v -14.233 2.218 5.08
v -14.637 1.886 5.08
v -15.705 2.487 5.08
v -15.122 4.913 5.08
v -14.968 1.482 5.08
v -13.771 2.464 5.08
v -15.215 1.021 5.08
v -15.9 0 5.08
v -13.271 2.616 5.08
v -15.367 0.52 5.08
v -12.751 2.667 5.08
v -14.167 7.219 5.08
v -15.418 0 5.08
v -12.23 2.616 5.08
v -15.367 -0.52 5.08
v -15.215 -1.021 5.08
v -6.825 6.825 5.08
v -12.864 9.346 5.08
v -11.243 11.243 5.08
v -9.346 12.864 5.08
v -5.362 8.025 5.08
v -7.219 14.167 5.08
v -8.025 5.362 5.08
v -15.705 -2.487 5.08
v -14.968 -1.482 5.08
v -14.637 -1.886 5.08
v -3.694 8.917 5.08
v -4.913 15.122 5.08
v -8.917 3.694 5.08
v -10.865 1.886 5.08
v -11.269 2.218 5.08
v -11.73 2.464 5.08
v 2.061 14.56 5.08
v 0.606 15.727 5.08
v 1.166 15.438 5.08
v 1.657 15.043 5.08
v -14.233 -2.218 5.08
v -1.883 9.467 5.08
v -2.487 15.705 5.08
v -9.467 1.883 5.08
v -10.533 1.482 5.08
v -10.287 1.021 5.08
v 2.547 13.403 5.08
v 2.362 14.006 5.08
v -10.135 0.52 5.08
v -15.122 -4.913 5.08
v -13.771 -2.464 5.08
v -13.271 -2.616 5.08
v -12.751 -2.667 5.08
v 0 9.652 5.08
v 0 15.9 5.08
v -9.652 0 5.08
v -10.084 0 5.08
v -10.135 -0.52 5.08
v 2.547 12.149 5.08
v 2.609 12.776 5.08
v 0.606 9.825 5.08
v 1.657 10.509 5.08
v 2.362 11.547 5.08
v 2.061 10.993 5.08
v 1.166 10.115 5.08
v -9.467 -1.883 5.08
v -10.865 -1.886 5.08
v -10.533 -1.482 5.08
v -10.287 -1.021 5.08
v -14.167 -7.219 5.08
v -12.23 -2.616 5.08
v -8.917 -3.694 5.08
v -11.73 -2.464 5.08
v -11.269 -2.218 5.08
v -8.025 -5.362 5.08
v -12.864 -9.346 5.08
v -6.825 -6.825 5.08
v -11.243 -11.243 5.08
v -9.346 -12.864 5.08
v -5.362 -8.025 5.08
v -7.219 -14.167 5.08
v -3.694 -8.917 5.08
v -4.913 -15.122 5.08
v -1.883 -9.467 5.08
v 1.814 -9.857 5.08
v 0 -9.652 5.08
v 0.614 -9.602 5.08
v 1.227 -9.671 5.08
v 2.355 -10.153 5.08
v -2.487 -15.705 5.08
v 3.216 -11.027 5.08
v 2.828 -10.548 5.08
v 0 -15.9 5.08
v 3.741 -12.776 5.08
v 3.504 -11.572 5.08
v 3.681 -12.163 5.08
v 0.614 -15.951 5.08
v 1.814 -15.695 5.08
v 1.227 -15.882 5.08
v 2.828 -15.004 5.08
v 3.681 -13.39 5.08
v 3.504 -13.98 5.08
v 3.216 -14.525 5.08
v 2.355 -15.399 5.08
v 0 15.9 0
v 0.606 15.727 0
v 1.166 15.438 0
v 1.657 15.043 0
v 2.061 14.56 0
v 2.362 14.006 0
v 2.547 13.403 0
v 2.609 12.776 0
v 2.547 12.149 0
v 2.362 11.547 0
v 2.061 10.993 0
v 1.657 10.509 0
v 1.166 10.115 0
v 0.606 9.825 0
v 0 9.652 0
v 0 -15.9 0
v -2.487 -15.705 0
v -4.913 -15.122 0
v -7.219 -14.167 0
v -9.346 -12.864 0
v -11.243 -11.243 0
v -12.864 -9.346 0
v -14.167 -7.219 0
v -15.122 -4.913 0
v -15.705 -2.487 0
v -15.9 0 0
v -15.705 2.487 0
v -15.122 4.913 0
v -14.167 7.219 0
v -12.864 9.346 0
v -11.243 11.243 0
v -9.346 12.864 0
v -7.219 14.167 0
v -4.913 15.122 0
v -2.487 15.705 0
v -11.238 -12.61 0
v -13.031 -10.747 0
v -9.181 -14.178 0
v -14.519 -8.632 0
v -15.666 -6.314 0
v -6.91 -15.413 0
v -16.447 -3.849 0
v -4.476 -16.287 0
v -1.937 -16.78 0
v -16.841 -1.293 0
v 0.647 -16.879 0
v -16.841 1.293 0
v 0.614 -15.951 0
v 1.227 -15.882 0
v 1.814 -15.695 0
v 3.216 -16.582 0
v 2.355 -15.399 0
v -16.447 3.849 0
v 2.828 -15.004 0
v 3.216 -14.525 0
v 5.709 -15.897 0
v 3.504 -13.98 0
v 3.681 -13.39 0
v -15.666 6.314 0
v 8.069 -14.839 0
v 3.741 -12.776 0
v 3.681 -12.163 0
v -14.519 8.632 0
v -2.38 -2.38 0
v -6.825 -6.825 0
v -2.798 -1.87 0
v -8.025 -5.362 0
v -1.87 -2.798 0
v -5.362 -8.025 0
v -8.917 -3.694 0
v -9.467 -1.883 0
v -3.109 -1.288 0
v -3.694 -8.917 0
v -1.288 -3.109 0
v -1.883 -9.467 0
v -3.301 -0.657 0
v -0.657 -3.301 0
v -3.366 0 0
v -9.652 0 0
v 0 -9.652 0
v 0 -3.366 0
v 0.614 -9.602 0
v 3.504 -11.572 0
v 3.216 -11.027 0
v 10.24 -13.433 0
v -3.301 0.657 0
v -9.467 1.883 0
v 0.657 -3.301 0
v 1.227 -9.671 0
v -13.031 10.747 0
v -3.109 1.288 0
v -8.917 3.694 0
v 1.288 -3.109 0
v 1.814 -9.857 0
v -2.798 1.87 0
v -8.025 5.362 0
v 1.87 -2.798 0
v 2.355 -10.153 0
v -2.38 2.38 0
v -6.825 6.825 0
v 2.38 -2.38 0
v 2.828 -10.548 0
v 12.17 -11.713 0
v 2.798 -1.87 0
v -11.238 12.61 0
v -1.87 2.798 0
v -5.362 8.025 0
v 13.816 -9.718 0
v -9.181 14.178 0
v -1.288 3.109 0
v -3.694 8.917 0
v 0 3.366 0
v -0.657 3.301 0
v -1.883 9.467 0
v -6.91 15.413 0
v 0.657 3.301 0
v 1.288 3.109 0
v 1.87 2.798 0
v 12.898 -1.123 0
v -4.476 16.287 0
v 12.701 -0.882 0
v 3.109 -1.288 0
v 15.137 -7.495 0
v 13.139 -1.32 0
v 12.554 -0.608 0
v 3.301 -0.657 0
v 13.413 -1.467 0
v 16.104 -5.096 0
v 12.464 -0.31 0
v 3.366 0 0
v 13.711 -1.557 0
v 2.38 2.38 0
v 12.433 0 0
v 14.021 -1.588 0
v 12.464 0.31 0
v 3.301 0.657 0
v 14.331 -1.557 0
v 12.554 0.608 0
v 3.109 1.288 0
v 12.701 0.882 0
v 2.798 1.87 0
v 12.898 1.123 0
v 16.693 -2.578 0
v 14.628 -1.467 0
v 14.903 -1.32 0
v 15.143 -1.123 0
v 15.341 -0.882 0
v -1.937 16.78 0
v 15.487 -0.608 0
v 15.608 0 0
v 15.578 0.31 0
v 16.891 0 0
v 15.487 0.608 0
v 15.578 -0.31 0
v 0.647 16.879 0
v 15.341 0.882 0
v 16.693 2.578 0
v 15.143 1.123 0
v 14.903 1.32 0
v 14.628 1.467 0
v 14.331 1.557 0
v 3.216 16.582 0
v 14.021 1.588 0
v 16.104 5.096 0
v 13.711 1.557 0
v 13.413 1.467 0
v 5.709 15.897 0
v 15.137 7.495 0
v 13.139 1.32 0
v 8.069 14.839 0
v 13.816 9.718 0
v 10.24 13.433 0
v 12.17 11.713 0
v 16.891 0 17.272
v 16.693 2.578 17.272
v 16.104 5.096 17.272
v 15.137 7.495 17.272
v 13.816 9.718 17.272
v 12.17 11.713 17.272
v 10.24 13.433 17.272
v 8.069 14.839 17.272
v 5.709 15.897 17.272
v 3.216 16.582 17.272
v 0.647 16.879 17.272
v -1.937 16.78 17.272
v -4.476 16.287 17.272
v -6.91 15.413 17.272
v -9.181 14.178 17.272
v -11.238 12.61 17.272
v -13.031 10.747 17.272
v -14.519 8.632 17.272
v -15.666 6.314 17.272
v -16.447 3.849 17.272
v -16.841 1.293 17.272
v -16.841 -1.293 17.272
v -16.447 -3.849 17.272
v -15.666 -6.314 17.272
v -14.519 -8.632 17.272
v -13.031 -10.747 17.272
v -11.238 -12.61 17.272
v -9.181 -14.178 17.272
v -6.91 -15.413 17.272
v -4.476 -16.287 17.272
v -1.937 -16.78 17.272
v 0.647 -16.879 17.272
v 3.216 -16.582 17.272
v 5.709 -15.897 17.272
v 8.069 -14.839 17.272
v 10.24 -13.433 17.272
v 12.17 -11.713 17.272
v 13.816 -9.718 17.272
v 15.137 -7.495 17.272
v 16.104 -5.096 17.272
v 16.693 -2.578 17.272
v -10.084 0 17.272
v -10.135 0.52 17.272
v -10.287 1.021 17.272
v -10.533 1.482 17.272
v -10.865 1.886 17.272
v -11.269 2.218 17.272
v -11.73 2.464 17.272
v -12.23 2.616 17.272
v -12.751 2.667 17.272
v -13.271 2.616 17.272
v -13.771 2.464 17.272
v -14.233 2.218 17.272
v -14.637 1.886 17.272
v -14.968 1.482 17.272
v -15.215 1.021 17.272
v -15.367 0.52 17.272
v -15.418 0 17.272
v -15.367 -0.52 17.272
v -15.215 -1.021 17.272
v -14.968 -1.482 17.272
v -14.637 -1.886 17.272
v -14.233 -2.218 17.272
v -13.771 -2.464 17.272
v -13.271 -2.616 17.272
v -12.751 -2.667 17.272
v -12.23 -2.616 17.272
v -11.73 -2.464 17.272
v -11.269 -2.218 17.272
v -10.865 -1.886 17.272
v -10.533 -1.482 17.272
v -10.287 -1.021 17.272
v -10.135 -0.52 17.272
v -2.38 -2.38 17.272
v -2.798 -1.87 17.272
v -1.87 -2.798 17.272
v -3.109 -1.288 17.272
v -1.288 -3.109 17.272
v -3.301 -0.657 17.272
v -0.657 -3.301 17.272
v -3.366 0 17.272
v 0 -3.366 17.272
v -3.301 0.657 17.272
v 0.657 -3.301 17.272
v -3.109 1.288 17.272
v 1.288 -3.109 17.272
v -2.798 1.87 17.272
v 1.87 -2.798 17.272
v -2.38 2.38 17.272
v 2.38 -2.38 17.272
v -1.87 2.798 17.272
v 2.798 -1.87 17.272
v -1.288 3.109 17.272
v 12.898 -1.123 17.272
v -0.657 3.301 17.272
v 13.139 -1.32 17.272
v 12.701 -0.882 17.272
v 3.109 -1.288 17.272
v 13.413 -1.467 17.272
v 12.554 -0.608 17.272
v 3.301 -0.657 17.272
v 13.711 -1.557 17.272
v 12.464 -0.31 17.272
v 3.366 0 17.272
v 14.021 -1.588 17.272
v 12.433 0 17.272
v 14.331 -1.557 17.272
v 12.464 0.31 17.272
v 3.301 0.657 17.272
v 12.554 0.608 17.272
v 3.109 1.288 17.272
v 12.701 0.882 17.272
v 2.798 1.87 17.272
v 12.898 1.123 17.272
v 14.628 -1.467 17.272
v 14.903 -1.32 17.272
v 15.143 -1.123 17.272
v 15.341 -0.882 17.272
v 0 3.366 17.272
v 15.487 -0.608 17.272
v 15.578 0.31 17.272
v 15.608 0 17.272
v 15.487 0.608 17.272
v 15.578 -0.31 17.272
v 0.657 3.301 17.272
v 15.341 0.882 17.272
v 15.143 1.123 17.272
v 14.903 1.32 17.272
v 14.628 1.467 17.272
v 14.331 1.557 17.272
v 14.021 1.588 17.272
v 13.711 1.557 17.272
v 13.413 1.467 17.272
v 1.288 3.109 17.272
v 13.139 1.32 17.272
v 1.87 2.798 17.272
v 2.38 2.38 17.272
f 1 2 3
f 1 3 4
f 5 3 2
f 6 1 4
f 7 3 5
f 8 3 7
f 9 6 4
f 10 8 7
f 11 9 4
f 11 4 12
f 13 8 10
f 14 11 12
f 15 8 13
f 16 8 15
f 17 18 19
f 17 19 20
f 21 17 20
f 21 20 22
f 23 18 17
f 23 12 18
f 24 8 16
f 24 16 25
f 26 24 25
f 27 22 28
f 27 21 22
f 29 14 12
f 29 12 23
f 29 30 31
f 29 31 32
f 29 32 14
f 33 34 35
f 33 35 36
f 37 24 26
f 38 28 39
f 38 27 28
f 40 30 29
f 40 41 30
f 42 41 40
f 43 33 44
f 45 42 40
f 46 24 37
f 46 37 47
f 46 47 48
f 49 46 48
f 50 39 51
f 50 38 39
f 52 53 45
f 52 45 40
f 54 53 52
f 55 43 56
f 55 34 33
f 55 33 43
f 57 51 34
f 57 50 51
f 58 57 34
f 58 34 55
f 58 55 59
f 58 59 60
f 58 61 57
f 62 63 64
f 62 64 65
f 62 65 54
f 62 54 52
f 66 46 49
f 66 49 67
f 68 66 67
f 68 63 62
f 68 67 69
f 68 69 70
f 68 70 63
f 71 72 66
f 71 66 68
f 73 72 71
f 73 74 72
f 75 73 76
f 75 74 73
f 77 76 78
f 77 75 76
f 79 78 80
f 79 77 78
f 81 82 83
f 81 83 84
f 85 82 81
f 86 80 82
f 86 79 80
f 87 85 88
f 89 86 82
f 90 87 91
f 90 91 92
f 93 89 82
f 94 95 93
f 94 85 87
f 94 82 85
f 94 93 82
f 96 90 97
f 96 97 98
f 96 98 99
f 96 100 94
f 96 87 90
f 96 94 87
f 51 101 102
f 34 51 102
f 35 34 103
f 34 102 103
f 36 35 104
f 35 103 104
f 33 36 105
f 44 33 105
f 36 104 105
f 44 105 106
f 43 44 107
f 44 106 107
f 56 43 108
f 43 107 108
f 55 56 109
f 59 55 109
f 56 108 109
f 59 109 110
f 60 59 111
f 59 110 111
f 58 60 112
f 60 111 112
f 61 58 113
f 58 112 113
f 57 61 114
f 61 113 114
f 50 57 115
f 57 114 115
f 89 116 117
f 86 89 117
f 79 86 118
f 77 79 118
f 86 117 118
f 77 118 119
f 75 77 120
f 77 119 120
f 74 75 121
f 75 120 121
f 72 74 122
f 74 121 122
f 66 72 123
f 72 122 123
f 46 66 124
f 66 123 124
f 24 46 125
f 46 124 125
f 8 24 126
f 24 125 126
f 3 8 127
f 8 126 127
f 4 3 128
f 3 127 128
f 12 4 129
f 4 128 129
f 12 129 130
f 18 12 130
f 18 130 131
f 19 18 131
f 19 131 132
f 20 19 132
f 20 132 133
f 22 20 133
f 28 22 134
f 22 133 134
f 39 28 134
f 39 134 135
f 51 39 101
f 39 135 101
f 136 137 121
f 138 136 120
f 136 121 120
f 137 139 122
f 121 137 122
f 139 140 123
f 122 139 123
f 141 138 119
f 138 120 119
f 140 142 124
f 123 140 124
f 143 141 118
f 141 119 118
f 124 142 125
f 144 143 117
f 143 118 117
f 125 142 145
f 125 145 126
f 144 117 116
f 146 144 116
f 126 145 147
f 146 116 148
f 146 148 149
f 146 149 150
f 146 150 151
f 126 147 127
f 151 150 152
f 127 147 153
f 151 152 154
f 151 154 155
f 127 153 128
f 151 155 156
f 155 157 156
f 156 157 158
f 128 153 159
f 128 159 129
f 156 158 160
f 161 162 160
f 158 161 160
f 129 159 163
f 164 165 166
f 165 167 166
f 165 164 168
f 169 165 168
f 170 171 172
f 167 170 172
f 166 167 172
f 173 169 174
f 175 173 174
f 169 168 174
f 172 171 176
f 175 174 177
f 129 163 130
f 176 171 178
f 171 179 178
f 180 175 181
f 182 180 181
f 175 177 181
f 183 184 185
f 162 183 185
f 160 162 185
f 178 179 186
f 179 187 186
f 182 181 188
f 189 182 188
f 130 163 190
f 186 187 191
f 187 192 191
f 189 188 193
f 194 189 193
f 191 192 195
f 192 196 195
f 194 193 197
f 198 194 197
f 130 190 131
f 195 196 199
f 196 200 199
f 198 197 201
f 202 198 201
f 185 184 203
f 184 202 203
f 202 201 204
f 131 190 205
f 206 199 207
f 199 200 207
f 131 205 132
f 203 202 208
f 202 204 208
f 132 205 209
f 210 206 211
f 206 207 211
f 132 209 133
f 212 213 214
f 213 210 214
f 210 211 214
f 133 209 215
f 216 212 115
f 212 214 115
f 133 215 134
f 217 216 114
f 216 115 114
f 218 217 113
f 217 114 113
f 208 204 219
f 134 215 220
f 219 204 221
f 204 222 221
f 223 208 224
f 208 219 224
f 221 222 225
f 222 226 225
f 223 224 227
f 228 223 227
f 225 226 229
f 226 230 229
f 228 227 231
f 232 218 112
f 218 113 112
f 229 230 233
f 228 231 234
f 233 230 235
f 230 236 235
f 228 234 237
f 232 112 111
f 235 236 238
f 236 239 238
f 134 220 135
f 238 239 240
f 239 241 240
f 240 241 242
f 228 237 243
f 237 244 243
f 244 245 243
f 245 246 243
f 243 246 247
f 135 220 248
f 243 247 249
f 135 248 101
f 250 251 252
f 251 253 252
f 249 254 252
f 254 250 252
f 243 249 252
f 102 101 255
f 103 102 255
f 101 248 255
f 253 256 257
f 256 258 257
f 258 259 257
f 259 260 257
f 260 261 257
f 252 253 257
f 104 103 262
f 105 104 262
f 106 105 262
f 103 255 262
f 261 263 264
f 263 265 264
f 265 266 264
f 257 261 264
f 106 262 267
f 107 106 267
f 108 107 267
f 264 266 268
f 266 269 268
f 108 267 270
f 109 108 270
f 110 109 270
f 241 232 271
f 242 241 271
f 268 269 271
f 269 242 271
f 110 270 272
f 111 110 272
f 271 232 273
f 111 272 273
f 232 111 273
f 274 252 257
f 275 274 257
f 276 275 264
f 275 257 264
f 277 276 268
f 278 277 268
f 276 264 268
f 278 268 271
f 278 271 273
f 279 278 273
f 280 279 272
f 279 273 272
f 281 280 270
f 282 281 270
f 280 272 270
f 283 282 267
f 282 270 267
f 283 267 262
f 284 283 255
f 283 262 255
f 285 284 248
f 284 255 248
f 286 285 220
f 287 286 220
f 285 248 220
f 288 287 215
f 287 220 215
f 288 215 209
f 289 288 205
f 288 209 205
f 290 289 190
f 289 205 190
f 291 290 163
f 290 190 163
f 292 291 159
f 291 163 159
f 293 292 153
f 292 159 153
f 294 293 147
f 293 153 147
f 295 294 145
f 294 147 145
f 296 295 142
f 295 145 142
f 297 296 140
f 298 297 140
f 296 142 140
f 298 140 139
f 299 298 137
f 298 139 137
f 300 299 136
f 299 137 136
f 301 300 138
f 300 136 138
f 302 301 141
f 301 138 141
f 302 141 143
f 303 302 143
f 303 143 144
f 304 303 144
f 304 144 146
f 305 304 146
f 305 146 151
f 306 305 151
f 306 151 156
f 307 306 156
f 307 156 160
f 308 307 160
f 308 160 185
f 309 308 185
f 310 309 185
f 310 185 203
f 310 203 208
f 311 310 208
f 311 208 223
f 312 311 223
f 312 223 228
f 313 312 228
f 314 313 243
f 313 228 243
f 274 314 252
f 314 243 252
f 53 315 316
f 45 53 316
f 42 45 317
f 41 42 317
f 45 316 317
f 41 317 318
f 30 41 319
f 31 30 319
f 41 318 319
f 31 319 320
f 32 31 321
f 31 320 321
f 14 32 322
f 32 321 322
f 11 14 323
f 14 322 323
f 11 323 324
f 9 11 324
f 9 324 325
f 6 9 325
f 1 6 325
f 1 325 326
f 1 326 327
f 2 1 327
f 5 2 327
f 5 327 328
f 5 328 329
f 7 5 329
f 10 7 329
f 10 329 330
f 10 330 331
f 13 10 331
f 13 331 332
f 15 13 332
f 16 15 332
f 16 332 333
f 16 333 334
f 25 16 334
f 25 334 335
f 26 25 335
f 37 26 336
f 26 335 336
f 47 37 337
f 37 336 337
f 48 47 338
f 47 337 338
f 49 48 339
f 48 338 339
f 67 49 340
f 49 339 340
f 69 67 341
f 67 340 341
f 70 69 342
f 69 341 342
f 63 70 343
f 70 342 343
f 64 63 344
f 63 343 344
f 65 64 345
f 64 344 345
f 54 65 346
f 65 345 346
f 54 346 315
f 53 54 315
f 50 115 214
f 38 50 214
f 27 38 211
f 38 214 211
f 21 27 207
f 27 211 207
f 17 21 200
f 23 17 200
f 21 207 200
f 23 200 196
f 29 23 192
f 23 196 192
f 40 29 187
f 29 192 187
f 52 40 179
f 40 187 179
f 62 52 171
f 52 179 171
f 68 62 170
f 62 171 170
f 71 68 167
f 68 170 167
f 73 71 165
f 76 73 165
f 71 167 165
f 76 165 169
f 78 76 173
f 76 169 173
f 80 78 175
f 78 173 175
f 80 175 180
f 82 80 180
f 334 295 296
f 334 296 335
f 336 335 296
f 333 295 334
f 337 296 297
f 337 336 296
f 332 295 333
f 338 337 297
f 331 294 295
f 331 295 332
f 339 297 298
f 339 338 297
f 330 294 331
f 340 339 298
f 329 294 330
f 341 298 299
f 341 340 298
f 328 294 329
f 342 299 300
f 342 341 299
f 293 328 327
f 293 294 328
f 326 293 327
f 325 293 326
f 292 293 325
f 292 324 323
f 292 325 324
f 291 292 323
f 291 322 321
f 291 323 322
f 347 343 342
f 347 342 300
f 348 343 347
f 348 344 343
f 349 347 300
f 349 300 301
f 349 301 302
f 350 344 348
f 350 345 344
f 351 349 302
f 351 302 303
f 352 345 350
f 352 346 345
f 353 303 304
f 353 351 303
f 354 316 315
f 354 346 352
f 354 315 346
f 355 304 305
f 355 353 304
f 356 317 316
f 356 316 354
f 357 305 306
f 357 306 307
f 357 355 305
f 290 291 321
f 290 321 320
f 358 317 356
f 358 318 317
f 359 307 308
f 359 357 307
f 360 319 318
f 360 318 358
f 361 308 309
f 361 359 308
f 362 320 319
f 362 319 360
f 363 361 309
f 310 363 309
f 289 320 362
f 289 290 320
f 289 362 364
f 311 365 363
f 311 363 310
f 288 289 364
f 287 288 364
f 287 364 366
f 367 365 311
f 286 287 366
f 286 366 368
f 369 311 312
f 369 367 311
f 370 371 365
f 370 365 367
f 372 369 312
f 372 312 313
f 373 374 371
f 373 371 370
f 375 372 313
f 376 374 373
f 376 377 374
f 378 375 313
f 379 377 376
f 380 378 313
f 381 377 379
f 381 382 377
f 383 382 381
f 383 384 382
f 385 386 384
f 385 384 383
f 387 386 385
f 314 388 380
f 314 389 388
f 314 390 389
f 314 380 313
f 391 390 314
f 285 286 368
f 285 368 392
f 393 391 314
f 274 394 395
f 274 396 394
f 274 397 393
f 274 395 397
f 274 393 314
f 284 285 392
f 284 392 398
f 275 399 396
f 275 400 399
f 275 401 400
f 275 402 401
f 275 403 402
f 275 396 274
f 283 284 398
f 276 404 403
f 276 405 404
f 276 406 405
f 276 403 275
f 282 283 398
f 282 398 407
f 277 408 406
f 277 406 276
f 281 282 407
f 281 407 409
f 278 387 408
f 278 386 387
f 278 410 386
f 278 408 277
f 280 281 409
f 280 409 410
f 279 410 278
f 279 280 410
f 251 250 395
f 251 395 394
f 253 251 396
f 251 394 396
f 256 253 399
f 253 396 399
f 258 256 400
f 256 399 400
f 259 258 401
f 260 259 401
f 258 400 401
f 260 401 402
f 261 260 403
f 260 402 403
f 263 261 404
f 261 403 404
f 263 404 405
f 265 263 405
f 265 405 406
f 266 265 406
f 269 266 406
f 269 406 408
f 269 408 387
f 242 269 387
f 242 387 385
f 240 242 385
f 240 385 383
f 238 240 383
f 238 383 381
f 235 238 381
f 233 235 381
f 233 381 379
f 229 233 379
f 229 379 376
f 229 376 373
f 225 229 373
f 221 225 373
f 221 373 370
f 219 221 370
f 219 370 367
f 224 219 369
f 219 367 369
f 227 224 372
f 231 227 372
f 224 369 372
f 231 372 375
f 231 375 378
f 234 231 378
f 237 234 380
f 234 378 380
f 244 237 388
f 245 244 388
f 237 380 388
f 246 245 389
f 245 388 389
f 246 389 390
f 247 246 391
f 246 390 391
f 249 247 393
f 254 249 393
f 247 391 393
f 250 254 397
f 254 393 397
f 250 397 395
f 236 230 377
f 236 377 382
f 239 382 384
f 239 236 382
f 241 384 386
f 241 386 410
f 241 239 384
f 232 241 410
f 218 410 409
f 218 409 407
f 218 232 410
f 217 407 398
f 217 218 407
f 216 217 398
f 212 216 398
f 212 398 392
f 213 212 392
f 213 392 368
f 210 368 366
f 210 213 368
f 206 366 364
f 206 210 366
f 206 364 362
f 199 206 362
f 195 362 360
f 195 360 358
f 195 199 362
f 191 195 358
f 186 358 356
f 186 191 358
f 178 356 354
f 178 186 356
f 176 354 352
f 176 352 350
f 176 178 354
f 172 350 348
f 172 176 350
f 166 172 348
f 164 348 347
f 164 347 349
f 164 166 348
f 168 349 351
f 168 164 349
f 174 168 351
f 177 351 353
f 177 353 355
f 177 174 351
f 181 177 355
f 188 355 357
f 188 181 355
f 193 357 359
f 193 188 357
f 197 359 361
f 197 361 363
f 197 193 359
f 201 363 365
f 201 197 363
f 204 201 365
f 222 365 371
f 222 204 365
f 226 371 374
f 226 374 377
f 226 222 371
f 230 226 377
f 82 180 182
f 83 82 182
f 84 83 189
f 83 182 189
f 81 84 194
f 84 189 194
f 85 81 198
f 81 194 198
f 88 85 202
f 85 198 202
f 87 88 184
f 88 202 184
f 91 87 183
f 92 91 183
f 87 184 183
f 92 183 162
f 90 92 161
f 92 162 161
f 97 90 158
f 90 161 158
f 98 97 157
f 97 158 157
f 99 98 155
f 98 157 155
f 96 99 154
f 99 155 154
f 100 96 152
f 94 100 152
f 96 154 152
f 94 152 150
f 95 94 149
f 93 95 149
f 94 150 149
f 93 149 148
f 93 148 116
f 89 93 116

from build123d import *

# Parameters (mm, degrees)
F0_R     = 16.891
F0_R_2   = 3.3655
F1_DEPTH = 17.272
F2_R     = 1.5875
F2_R_2   = 2.667
F3_DEPTH = 25.4
F5_DEPTH = 5.08


with BuildPart() as f1:
    # F0 (on Top) → F1 (new body)
    with BuildSketch(Plane.XY):
        Circle(F0_R)
        Circle(F0_R_2, mode=Mode.SUBTRACT)
    extrude(amount=F1_DEPTH)

    # F2 (on face) → F3 (cut)
    with BuildSketch(Plane.XY.offset(17.272)):
        with Locations((14.0208, 0)):
            Circle(F2_R)
        with Locations((-12.7508, 0)):
            Circle(F2_R_2)
    extrude(amount=-F3_DEPTH, mode=Mode.SUBTRACT)

    # F4 (on face) → F5 (cut)
    with BuildSketch(Plane(origin=(0, 0, 0), x_dir=(1, 0, 0), z_dir=(0, 0, -1))):
        with BuildLine():
            ThreePointArc((0, -9.652), (-9.652, 0), (0, 9.652))
            ThreePointArc((0, 9.652), (3.740685, 12.7762), (0, 15.9004))
            ThreePointArc((0, 15.9004), (-15.9004, 0), (0, -15.9004))
            ThreePointArc((0, -15.9004), (2.609315, -12.7762), (0, -9.652))
        make_face()
    extrude(amount=-F5_DEPTH, mode=Mode.SUBTRACT)


solid = f1.part
